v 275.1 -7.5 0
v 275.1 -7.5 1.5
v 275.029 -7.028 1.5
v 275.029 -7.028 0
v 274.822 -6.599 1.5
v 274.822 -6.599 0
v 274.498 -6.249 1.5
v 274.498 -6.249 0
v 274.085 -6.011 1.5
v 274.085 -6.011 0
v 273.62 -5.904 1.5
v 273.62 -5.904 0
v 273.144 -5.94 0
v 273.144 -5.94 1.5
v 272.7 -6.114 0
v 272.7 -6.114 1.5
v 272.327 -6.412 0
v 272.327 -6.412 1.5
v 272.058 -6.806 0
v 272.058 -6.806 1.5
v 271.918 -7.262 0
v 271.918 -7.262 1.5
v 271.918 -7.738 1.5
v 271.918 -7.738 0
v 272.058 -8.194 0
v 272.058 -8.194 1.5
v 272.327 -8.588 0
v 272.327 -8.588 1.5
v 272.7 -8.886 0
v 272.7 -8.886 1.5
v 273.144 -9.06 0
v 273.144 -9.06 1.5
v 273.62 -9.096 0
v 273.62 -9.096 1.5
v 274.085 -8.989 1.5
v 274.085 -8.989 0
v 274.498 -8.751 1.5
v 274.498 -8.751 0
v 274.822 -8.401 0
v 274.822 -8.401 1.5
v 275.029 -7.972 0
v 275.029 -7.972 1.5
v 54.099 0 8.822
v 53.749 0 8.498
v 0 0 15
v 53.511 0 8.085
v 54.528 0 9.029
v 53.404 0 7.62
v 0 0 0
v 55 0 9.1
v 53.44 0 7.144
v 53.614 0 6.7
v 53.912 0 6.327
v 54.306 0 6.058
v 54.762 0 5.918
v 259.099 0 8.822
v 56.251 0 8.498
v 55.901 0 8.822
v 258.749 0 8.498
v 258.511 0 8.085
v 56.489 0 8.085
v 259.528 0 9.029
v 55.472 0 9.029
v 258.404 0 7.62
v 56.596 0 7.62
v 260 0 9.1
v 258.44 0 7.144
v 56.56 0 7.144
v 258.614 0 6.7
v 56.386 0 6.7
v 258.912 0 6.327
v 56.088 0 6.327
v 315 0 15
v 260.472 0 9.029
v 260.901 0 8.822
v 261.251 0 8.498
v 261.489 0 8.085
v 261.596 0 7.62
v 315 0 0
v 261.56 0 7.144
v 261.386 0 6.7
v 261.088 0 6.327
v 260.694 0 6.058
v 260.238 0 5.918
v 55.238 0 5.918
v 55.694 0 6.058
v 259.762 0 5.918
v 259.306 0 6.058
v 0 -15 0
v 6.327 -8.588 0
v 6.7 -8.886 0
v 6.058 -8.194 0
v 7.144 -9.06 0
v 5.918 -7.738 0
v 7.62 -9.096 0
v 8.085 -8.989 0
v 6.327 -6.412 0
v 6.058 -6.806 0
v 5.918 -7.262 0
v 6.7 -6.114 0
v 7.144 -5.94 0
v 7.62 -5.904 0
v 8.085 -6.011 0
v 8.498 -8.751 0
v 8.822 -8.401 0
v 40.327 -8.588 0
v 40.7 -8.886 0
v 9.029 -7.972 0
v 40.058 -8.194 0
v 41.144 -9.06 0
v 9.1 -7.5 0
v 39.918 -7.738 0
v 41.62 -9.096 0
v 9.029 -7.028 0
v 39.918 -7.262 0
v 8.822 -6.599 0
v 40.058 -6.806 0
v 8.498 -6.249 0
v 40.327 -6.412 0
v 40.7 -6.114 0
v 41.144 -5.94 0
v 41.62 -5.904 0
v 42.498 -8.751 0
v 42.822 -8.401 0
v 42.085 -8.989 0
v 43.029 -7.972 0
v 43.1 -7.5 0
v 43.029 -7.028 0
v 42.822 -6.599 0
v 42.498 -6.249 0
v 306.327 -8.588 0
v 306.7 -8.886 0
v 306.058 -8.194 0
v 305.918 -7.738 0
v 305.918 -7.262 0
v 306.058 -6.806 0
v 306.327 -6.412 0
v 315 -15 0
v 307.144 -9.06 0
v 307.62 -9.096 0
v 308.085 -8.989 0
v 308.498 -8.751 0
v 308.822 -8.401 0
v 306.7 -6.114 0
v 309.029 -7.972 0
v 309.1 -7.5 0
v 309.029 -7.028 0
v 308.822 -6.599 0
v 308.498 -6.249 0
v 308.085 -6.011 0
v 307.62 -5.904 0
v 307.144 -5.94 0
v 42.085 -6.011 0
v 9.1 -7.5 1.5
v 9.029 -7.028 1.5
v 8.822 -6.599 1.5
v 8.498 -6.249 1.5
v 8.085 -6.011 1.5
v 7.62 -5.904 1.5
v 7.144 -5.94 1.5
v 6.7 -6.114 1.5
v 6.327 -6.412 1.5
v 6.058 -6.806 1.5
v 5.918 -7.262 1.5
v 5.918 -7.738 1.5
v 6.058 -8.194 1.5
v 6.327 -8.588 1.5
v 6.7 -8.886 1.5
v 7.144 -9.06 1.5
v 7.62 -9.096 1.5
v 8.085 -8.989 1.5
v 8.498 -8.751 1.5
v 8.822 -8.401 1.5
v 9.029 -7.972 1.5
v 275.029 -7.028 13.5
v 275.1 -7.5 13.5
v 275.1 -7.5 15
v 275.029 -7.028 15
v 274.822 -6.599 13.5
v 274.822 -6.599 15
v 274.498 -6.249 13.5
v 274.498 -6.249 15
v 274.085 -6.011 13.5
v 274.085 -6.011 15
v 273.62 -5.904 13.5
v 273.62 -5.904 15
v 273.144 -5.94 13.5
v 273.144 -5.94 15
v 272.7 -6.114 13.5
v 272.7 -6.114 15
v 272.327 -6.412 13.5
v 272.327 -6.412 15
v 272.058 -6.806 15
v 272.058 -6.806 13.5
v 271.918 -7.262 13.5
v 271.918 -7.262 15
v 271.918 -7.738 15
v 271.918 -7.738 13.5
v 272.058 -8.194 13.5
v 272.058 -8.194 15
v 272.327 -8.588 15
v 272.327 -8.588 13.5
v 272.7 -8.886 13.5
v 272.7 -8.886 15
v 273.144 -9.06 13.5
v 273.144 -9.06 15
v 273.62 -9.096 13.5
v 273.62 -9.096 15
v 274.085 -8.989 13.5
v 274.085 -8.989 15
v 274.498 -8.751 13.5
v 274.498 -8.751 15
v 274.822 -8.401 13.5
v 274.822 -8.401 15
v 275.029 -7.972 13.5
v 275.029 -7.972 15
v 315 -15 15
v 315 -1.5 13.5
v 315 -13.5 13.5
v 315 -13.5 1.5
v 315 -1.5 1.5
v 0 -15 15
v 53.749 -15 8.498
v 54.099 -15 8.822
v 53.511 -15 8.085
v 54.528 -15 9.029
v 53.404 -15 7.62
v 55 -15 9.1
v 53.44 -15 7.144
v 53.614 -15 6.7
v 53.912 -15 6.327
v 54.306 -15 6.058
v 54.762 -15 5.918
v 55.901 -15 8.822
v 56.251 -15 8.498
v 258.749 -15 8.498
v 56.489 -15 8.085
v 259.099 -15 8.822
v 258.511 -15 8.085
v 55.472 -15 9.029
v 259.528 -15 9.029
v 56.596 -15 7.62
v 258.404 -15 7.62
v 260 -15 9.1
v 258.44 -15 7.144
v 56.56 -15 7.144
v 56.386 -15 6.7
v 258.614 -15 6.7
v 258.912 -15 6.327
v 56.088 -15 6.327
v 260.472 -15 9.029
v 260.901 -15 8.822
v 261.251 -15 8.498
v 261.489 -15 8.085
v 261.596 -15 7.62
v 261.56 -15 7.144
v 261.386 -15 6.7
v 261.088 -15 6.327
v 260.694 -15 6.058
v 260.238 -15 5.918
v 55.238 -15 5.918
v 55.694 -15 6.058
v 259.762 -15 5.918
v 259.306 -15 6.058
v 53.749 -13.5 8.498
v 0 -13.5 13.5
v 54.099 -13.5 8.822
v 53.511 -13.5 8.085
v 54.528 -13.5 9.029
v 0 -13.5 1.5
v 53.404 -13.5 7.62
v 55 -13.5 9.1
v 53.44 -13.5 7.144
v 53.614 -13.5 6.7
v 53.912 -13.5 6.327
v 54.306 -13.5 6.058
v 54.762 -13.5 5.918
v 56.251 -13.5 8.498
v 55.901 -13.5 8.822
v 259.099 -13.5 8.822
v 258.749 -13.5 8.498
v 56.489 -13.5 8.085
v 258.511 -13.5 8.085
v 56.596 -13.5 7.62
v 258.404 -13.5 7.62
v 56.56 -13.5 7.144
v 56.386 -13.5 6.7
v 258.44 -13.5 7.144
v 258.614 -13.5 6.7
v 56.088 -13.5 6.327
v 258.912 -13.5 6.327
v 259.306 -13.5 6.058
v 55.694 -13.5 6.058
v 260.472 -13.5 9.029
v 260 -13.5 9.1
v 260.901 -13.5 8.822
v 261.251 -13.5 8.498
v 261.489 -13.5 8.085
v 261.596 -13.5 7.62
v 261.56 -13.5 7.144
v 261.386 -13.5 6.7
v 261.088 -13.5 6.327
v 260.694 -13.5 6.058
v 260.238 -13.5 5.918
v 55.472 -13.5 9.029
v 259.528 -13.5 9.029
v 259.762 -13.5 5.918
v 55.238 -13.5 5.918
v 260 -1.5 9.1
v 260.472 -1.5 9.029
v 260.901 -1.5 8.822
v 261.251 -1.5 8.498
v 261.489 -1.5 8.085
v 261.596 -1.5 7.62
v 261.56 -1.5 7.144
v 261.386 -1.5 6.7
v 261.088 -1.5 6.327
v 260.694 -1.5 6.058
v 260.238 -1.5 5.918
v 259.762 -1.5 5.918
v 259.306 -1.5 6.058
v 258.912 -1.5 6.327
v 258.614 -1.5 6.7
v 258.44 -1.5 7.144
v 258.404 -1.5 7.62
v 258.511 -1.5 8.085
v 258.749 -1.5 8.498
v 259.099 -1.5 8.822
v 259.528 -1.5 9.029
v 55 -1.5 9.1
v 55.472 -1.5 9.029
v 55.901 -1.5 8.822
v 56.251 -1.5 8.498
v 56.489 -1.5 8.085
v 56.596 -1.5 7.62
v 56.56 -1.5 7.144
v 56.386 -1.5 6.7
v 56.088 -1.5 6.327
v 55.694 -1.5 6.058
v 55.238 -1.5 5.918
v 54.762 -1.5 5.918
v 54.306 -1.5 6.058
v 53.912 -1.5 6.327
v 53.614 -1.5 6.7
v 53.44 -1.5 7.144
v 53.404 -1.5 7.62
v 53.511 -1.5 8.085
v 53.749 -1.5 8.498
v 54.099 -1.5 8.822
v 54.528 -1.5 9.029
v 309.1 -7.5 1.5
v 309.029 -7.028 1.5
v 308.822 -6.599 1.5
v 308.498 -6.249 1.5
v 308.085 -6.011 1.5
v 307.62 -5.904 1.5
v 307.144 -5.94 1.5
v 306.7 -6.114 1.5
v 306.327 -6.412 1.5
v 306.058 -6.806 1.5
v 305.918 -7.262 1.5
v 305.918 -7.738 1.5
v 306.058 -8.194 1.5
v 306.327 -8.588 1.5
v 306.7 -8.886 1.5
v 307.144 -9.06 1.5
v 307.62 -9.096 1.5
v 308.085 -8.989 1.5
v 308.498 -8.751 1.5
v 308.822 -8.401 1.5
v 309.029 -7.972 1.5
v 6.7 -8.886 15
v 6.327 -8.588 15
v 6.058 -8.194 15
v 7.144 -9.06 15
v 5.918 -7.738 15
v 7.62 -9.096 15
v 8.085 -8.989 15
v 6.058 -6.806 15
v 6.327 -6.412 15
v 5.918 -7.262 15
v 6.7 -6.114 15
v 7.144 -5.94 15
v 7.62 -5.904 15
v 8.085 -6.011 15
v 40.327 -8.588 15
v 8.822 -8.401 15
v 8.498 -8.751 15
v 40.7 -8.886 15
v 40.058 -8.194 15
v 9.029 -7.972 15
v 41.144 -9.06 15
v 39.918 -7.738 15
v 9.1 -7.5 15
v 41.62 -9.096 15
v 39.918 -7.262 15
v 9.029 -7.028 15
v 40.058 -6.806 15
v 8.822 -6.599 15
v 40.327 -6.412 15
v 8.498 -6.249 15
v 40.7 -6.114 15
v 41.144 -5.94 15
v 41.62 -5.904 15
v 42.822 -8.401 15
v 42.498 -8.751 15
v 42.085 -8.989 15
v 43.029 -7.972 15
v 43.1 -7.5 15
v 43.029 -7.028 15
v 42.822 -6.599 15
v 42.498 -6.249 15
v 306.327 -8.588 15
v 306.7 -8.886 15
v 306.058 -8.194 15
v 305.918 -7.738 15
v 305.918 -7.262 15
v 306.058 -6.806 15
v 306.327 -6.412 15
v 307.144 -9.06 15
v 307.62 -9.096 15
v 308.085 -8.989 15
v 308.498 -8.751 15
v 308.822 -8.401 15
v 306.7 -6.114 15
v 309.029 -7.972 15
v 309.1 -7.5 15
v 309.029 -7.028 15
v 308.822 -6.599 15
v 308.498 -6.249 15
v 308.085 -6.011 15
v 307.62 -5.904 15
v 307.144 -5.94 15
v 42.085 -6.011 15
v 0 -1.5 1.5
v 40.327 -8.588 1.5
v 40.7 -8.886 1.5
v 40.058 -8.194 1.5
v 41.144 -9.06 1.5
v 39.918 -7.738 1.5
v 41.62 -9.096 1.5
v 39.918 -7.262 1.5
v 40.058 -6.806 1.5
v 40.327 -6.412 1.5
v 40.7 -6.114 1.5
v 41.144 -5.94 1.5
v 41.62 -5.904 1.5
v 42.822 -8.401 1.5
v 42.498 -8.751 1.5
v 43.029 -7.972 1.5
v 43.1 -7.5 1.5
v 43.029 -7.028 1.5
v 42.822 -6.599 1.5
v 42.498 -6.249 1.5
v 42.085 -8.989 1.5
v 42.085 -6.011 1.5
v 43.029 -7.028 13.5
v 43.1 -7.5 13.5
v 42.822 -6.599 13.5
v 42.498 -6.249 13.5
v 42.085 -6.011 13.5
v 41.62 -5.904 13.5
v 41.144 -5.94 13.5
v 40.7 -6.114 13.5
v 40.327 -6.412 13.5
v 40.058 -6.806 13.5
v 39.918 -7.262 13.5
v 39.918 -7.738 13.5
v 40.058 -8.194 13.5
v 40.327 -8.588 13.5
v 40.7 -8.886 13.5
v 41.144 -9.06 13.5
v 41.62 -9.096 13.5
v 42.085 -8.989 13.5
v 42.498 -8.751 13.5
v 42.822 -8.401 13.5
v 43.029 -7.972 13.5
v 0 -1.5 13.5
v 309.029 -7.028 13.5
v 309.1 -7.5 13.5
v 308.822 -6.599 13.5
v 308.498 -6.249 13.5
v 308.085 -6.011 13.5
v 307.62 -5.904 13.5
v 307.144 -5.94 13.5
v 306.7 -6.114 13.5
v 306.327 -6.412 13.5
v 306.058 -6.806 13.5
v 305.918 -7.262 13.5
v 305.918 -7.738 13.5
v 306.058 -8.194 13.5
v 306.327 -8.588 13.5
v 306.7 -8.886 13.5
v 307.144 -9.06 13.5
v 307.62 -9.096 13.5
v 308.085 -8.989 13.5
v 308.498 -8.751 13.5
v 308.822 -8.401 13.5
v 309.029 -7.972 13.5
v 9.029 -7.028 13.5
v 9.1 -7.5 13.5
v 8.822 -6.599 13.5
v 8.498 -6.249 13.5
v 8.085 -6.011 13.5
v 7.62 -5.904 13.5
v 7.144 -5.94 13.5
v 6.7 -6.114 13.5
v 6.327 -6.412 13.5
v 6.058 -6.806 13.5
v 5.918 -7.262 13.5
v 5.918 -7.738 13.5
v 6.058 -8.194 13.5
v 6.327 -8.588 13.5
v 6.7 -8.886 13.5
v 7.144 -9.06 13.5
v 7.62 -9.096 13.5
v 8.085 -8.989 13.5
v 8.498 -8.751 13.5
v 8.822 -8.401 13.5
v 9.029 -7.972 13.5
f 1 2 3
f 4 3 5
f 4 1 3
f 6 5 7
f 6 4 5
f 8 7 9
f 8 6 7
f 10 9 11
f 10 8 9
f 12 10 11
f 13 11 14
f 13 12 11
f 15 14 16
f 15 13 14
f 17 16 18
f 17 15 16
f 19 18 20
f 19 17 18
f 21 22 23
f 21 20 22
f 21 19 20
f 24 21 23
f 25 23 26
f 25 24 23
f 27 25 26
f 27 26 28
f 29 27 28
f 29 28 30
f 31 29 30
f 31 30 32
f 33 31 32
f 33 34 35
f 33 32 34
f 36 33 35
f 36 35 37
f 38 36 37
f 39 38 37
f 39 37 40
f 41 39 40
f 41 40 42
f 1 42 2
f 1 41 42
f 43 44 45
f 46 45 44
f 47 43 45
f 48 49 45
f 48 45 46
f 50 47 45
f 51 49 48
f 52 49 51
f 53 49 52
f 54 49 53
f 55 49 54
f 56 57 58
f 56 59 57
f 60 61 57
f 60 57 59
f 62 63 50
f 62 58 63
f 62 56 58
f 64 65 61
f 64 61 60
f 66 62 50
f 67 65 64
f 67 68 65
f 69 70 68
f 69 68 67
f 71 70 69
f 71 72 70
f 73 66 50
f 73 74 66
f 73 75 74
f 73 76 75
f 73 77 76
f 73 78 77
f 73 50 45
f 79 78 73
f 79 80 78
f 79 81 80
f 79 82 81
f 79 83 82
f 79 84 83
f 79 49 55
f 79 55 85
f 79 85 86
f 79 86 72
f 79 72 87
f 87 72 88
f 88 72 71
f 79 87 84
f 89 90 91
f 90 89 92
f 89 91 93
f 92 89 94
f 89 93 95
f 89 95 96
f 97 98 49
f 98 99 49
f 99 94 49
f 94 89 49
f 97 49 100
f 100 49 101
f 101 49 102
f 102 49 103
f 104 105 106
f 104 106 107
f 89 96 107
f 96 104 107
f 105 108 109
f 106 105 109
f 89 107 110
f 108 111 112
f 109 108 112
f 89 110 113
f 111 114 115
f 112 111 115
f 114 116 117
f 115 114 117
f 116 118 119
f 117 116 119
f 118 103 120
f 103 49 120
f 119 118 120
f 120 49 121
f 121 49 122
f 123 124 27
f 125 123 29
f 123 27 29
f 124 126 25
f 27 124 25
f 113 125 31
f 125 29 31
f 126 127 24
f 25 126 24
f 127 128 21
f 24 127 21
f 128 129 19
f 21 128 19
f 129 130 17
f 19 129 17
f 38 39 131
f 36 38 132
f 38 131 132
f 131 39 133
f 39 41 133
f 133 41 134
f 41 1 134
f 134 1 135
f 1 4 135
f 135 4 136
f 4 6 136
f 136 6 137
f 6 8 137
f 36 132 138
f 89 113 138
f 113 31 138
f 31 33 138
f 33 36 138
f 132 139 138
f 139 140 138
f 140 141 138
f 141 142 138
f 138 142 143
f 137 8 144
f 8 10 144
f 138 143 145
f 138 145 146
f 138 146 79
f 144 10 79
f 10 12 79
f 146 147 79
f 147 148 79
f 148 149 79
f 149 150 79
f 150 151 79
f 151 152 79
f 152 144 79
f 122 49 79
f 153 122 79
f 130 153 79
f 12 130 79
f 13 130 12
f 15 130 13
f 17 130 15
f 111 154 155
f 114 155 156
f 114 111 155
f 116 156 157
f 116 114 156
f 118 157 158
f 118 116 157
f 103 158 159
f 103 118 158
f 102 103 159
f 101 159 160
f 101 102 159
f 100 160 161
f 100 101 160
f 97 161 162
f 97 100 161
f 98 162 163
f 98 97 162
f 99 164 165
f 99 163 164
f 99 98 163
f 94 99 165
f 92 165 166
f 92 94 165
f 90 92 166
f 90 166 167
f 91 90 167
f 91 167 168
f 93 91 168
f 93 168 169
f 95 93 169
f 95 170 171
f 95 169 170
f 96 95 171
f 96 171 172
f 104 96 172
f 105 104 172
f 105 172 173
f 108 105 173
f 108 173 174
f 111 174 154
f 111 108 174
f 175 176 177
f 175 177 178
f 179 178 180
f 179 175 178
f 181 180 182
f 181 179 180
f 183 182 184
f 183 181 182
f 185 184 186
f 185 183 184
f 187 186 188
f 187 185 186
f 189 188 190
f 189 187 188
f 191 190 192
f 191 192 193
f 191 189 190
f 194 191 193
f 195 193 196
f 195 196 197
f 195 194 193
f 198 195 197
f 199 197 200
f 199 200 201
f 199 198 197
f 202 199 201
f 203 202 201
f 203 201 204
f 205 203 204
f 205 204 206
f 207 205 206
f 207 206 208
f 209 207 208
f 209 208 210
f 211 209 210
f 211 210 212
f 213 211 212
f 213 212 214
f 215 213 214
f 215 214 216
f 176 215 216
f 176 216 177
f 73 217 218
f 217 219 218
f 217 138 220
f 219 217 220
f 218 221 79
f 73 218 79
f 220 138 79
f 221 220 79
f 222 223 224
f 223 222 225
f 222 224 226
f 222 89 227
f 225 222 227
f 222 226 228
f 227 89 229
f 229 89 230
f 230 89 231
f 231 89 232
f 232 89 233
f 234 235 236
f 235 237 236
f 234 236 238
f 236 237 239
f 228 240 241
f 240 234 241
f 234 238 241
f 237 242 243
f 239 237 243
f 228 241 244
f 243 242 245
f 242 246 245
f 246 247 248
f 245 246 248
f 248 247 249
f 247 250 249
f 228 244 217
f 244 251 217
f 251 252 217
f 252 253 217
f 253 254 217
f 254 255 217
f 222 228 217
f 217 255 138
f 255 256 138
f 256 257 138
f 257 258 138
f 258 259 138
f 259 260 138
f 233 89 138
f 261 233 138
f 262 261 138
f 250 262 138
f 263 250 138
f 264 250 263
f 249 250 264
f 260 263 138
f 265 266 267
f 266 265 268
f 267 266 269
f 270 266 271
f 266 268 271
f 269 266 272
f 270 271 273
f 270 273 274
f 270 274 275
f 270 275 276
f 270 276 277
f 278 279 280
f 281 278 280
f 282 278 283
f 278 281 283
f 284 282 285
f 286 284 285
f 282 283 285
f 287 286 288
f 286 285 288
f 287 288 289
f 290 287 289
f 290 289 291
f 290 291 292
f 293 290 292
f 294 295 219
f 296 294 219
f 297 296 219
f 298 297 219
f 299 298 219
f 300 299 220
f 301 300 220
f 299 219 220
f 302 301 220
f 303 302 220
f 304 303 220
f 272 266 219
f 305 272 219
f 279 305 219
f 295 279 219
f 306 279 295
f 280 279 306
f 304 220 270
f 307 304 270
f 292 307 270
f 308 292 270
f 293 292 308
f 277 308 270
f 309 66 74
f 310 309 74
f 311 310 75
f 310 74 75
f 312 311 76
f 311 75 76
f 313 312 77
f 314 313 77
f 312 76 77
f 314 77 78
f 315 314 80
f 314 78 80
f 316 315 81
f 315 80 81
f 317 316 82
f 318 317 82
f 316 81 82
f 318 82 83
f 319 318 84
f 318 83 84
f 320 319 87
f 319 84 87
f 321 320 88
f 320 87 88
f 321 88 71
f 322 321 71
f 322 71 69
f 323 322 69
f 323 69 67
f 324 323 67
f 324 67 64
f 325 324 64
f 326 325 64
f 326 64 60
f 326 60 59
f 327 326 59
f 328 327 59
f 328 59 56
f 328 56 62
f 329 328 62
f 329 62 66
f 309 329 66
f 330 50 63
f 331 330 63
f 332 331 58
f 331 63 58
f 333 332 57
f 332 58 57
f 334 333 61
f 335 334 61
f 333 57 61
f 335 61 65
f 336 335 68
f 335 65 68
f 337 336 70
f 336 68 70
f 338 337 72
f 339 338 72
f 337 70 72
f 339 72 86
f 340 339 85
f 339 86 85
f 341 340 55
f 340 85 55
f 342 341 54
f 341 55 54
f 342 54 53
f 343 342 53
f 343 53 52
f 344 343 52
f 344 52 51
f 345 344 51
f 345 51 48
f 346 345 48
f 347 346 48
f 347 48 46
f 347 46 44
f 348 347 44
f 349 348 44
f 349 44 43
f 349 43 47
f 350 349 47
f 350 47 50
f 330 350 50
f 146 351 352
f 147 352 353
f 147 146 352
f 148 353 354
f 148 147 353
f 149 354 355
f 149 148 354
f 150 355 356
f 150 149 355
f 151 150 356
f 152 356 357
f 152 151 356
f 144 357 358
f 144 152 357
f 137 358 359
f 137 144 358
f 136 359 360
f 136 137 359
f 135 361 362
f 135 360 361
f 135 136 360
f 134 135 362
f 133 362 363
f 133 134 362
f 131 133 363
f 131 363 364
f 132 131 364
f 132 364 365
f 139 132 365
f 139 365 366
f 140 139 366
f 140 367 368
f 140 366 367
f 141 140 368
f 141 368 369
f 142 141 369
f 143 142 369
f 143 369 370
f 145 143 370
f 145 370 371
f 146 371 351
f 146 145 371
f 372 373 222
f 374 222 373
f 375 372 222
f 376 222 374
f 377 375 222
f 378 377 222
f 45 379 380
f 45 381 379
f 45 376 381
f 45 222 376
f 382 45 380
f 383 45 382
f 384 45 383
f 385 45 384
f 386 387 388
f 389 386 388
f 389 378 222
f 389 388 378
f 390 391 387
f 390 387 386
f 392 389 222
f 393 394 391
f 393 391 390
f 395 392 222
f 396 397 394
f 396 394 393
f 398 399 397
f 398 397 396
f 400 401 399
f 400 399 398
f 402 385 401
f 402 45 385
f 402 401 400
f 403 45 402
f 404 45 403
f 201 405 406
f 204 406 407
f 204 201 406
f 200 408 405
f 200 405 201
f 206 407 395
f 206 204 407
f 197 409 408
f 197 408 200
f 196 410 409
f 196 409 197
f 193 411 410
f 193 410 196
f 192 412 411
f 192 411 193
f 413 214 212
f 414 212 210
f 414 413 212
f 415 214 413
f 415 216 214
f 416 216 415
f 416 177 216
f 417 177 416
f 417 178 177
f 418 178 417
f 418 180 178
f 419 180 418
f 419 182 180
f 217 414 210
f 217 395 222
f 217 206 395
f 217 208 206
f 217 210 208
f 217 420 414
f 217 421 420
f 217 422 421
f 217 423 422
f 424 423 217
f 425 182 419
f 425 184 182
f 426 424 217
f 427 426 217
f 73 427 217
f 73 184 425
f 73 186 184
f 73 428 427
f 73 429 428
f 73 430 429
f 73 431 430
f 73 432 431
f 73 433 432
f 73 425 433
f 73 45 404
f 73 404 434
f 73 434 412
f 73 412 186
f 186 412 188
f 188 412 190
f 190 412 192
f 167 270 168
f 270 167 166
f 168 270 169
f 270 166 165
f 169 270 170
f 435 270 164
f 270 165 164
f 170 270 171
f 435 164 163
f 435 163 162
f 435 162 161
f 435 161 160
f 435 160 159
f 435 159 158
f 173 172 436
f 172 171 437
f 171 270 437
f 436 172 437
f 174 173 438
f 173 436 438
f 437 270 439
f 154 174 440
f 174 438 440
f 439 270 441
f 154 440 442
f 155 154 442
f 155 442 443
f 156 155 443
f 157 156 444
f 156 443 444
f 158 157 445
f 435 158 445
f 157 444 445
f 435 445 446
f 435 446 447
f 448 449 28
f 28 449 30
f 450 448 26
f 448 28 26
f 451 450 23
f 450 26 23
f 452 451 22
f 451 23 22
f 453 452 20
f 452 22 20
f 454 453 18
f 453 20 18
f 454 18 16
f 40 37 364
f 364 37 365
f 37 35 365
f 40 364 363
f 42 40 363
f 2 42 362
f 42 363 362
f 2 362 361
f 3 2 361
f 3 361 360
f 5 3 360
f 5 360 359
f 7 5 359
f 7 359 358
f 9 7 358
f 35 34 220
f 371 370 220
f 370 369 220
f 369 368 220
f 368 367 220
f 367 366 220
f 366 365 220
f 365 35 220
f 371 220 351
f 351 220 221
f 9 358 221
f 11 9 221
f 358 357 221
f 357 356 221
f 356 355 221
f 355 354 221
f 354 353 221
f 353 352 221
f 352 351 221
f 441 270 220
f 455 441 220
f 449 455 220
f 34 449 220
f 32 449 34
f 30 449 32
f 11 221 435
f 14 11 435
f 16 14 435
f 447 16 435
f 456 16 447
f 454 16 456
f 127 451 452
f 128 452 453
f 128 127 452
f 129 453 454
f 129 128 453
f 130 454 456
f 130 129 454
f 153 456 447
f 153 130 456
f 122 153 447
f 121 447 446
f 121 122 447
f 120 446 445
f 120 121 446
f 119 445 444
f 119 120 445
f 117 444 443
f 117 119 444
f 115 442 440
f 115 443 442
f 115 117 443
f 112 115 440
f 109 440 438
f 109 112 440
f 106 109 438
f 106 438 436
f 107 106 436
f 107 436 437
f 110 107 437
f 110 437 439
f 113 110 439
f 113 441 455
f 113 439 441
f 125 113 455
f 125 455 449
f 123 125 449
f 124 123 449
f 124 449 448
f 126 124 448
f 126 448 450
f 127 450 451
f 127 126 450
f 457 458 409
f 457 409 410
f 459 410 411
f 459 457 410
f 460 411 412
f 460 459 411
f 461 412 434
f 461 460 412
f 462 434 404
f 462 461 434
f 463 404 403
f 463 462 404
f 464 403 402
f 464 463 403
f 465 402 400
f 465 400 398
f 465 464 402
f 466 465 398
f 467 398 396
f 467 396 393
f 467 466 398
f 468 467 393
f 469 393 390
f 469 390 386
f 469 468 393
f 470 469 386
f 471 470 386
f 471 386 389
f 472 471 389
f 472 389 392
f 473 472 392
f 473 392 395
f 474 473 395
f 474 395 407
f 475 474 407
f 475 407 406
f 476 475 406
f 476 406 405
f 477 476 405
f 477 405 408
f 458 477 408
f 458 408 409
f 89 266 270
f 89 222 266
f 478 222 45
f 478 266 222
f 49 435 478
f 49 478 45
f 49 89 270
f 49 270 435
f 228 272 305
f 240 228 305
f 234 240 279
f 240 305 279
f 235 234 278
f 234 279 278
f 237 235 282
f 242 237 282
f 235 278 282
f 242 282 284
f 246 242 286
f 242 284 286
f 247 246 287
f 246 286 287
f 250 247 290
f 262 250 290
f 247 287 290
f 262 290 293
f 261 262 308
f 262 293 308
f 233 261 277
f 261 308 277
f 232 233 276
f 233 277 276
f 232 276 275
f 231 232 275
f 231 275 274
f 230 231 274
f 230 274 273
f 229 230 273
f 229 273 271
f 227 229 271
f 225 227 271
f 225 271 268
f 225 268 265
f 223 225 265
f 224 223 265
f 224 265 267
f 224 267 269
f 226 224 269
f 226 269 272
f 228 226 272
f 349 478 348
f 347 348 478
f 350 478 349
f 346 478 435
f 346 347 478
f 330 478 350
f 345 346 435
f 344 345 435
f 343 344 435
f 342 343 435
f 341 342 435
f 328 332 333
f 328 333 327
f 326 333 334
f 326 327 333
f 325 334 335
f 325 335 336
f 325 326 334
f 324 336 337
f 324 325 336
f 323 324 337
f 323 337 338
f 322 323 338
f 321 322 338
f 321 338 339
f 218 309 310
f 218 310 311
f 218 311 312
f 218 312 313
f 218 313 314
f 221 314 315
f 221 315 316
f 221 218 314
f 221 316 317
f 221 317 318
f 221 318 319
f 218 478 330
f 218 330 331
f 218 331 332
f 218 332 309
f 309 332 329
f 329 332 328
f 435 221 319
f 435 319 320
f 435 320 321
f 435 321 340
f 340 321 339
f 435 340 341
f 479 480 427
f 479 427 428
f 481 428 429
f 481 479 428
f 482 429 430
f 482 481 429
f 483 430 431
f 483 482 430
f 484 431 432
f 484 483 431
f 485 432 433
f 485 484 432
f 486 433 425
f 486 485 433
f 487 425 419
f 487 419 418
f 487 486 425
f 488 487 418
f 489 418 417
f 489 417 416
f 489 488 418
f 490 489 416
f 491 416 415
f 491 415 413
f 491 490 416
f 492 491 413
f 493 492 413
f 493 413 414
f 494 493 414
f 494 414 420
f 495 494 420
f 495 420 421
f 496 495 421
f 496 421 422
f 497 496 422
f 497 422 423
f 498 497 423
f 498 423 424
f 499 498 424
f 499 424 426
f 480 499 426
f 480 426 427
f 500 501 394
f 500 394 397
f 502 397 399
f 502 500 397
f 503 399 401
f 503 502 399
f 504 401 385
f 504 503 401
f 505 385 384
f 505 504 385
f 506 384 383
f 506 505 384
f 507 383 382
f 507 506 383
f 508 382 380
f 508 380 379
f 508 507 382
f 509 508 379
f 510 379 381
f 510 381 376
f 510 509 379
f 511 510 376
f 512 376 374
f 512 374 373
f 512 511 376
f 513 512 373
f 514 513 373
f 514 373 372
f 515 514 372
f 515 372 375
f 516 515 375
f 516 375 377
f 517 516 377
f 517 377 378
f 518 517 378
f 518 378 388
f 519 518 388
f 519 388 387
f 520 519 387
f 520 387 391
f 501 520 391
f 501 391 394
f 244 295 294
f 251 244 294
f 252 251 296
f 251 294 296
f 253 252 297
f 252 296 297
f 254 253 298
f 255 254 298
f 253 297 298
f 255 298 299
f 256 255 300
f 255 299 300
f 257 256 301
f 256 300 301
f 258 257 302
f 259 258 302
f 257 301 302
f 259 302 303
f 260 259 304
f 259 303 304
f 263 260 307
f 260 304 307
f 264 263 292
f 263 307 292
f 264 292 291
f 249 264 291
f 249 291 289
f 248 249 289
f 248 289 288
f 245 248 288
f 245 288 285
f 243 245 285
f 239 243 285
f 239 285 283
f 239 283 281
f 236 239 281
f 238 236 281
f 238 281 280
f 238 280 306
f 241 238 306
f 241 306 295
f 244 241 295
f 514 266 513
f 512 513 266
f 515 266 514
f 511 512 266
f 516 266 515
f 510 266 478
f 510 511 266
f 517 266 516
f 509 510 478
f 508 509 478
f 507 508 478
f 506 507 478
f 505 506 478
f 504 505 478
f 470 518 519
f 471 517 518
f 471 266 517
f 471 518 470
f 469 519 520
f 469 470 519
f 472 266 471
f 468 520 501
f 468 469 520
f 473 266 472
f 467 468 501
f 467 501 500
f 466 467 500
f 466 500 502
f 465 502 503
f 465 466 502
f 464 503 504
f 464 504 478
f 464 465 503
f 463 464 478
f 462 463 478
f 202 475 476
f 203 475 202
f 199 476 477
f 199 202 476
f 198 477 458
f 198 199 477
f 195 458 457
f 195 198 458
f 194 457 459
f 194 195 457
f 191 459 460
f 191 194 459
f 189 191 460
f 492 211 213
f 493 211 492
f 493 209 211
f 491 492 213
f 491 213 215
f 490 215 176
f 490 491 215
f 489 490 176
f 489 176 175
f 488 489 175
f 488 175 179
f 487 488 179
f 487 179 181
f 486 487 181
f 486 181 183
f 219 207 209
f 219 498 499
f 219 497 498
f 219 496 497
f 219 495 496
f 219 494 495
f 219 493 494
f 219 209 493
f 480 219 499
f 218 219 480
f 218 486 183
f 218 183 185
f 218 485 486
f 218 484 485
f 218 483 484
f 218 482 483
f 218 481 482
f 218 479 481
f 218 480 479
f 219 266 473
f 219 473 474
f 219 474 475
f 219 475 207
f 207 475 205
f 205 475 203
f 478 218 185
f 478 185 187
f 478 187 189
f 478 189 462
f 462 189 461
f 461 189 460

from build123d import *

# Parameters (mm, degrees)
SKETCH_2_W          = 315
SKETCH_2_H          = 15
SKETCH_2_R          = 1.6
EXTRUDE_1_DEPTH     = 15
SKETCH_3_W          = 12
SKETCH_3_H          = 12
CUT_EXTRUDE_1_DEPTH = 316.713477698
SKETCH_4_R          = 1.6
CUT_EXTRUDE_2_DEPTH = 316.713477698


with BuildPart() as part:
    # ｽｹｯﾁ2 → ﾎﾞｽ - 押し出し1 (new body)
    with BuildSketch(Plane.XY):
        with Locations((157.5, -7.5)):
            Rectangle(SKETCH_2_W, SKETCH_2_H)
        with Locations((7.5, -7.5)):
            Circle(SKETCH_2_R, mode=Mode.SUBTRACT)
        with Locations((41.5, -7.5)):
            Circle(SKETCH_2_R, mode=Mode.SUBTRACT)
        with Locations((273.5, -7.5)):
            Circle(SKETCH_2_R, mode=Mode.SUBTRACT)
        with Locations((307.5, -7.5)):
            Circle(SKETCH_2_R, mode=Mode.SUBTRACT)
    extrude(amount=EXTRUDE_1_DEPTH)

    # ｽｹｯﾁ3 → ｶｯﾄ - 押し出し1 (cut, through all)
    with BuildSketch(Plane(origin=(315, 0, 0), x_dir=(0, 0, -1), z_dir=(1, 0, 0))):
        with Locations((-7.5, -7.5)):
            Rectangle(SKETCH_3_W, SKETCH_3_H)
    extrude(amount=-CUT_EXTRUDE_1_DEPTH, mode=Mode.SUBTRACT)

    # ｽｹｯﾁ4 → ｶｯﾄ - 押し出し2 (cut, through all)
    with BuildSketch(Plane(origin=(0, 0, 0), x_dir=(1, 0, 0), z_dir=(0, 1, 0))):
        with Locations(Location((55, -7.5, 0), (0, 0, 270))):
            Circle(SKETCH_4_R)
        with Locations(Location((260, -7.5, 0), (0, 0, 270))):
            Circle(SKETCH_4_R)
    extrude(amount=-CUT_EXTRUDE_2_DEPTH, mode=Mode.SUBTRACT)


solid = part.part
